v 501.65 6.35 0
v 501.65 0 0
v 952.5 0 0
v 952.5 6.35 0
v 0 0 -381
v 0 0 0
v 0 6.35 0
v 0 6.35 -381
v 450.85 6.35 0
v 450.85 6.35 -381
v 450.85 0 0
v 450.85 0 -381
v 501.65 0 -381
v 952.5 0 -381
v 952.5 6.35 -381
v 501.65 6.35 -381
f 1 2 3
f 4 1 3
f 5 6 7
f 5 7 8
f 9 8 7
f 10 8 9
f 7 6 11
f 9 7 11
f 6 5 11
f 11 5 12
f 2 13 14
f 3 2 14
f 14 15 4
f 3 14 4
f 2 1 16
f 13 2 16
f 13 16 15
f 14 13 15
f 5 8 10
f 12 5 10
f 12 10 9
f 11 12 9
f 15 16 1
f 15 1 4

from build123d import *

# Parameters (mm, degrees)
SKETCH1_W           = 1219.2
SKETCH1_H           = 609.6
BOSS_EXTRUDE1_DEPTH = 6.35
CUT_EXTRUDE1_REACH  = 1365.122


with BuildPart() as part:
    # Sketch1 → Boss-Extrude1 (new body)
    with BuildSketch(Plane(origin=(0, 0, 0), x_dir=(1, 0, 0), z_dir=(0, 1, 0))):
        with Locations((609.6, 304.8)):
            Rectangle(SKETCH1_W, SKETCH1_H)
    extrude(amount=BOSS_EXTRUDE1_DEPTH)

    # Sketch7 → Cut-Extrude1 (cut, up to next)
    with BuildSketch(Plane(origin=(0, 6.35, 0), x_dir=(1, 0, 0), z_dir=(0, 1, 0)), mode=Mode.PRIVATE) as cut_extrude1_sk1:
        Polygon((501.65, 381), (952.5, 381), (952.5, 0), (1219.2, 0), (1219.2, 381), (1219.2, 609.6), (0, 609.6), (0, 381), (450.85, 381), (450.85, 0), (501.65, 0), align=None)
    cut_extrude1_tool1 = extrude(cut_extrude1_sk1.sketch, amount=-CUT_EXTRUDE1_REACH, mode=Mode.PRIVATE) & part.part
    add(cut_extrude1_tool1.solids().sort_by_distance((724.222881, 6.35, -403.048184))[0], mode=Mode.SUBTRACT)


with BuildPart() as cut_extrude1_piece_1:
    # of the separate pieces the step leaves, piece 1, a body of its own (cut_extrude1_pieces)
    add(part.part.solids().sort_by_distance((0, 0, 0))[0])


with BuildPart() as cut_extrude1_piece_2:
    # of the separate pieces the step leaves, piece 2, a body of its own (cut_extrude1_pieces)
    add(part.part.solids().sort_by_distance((501.65, 0, 0))[0])


solid = Compound([cut_extrude1_piece_1.part, cut_extrude1_piece_2.part])
